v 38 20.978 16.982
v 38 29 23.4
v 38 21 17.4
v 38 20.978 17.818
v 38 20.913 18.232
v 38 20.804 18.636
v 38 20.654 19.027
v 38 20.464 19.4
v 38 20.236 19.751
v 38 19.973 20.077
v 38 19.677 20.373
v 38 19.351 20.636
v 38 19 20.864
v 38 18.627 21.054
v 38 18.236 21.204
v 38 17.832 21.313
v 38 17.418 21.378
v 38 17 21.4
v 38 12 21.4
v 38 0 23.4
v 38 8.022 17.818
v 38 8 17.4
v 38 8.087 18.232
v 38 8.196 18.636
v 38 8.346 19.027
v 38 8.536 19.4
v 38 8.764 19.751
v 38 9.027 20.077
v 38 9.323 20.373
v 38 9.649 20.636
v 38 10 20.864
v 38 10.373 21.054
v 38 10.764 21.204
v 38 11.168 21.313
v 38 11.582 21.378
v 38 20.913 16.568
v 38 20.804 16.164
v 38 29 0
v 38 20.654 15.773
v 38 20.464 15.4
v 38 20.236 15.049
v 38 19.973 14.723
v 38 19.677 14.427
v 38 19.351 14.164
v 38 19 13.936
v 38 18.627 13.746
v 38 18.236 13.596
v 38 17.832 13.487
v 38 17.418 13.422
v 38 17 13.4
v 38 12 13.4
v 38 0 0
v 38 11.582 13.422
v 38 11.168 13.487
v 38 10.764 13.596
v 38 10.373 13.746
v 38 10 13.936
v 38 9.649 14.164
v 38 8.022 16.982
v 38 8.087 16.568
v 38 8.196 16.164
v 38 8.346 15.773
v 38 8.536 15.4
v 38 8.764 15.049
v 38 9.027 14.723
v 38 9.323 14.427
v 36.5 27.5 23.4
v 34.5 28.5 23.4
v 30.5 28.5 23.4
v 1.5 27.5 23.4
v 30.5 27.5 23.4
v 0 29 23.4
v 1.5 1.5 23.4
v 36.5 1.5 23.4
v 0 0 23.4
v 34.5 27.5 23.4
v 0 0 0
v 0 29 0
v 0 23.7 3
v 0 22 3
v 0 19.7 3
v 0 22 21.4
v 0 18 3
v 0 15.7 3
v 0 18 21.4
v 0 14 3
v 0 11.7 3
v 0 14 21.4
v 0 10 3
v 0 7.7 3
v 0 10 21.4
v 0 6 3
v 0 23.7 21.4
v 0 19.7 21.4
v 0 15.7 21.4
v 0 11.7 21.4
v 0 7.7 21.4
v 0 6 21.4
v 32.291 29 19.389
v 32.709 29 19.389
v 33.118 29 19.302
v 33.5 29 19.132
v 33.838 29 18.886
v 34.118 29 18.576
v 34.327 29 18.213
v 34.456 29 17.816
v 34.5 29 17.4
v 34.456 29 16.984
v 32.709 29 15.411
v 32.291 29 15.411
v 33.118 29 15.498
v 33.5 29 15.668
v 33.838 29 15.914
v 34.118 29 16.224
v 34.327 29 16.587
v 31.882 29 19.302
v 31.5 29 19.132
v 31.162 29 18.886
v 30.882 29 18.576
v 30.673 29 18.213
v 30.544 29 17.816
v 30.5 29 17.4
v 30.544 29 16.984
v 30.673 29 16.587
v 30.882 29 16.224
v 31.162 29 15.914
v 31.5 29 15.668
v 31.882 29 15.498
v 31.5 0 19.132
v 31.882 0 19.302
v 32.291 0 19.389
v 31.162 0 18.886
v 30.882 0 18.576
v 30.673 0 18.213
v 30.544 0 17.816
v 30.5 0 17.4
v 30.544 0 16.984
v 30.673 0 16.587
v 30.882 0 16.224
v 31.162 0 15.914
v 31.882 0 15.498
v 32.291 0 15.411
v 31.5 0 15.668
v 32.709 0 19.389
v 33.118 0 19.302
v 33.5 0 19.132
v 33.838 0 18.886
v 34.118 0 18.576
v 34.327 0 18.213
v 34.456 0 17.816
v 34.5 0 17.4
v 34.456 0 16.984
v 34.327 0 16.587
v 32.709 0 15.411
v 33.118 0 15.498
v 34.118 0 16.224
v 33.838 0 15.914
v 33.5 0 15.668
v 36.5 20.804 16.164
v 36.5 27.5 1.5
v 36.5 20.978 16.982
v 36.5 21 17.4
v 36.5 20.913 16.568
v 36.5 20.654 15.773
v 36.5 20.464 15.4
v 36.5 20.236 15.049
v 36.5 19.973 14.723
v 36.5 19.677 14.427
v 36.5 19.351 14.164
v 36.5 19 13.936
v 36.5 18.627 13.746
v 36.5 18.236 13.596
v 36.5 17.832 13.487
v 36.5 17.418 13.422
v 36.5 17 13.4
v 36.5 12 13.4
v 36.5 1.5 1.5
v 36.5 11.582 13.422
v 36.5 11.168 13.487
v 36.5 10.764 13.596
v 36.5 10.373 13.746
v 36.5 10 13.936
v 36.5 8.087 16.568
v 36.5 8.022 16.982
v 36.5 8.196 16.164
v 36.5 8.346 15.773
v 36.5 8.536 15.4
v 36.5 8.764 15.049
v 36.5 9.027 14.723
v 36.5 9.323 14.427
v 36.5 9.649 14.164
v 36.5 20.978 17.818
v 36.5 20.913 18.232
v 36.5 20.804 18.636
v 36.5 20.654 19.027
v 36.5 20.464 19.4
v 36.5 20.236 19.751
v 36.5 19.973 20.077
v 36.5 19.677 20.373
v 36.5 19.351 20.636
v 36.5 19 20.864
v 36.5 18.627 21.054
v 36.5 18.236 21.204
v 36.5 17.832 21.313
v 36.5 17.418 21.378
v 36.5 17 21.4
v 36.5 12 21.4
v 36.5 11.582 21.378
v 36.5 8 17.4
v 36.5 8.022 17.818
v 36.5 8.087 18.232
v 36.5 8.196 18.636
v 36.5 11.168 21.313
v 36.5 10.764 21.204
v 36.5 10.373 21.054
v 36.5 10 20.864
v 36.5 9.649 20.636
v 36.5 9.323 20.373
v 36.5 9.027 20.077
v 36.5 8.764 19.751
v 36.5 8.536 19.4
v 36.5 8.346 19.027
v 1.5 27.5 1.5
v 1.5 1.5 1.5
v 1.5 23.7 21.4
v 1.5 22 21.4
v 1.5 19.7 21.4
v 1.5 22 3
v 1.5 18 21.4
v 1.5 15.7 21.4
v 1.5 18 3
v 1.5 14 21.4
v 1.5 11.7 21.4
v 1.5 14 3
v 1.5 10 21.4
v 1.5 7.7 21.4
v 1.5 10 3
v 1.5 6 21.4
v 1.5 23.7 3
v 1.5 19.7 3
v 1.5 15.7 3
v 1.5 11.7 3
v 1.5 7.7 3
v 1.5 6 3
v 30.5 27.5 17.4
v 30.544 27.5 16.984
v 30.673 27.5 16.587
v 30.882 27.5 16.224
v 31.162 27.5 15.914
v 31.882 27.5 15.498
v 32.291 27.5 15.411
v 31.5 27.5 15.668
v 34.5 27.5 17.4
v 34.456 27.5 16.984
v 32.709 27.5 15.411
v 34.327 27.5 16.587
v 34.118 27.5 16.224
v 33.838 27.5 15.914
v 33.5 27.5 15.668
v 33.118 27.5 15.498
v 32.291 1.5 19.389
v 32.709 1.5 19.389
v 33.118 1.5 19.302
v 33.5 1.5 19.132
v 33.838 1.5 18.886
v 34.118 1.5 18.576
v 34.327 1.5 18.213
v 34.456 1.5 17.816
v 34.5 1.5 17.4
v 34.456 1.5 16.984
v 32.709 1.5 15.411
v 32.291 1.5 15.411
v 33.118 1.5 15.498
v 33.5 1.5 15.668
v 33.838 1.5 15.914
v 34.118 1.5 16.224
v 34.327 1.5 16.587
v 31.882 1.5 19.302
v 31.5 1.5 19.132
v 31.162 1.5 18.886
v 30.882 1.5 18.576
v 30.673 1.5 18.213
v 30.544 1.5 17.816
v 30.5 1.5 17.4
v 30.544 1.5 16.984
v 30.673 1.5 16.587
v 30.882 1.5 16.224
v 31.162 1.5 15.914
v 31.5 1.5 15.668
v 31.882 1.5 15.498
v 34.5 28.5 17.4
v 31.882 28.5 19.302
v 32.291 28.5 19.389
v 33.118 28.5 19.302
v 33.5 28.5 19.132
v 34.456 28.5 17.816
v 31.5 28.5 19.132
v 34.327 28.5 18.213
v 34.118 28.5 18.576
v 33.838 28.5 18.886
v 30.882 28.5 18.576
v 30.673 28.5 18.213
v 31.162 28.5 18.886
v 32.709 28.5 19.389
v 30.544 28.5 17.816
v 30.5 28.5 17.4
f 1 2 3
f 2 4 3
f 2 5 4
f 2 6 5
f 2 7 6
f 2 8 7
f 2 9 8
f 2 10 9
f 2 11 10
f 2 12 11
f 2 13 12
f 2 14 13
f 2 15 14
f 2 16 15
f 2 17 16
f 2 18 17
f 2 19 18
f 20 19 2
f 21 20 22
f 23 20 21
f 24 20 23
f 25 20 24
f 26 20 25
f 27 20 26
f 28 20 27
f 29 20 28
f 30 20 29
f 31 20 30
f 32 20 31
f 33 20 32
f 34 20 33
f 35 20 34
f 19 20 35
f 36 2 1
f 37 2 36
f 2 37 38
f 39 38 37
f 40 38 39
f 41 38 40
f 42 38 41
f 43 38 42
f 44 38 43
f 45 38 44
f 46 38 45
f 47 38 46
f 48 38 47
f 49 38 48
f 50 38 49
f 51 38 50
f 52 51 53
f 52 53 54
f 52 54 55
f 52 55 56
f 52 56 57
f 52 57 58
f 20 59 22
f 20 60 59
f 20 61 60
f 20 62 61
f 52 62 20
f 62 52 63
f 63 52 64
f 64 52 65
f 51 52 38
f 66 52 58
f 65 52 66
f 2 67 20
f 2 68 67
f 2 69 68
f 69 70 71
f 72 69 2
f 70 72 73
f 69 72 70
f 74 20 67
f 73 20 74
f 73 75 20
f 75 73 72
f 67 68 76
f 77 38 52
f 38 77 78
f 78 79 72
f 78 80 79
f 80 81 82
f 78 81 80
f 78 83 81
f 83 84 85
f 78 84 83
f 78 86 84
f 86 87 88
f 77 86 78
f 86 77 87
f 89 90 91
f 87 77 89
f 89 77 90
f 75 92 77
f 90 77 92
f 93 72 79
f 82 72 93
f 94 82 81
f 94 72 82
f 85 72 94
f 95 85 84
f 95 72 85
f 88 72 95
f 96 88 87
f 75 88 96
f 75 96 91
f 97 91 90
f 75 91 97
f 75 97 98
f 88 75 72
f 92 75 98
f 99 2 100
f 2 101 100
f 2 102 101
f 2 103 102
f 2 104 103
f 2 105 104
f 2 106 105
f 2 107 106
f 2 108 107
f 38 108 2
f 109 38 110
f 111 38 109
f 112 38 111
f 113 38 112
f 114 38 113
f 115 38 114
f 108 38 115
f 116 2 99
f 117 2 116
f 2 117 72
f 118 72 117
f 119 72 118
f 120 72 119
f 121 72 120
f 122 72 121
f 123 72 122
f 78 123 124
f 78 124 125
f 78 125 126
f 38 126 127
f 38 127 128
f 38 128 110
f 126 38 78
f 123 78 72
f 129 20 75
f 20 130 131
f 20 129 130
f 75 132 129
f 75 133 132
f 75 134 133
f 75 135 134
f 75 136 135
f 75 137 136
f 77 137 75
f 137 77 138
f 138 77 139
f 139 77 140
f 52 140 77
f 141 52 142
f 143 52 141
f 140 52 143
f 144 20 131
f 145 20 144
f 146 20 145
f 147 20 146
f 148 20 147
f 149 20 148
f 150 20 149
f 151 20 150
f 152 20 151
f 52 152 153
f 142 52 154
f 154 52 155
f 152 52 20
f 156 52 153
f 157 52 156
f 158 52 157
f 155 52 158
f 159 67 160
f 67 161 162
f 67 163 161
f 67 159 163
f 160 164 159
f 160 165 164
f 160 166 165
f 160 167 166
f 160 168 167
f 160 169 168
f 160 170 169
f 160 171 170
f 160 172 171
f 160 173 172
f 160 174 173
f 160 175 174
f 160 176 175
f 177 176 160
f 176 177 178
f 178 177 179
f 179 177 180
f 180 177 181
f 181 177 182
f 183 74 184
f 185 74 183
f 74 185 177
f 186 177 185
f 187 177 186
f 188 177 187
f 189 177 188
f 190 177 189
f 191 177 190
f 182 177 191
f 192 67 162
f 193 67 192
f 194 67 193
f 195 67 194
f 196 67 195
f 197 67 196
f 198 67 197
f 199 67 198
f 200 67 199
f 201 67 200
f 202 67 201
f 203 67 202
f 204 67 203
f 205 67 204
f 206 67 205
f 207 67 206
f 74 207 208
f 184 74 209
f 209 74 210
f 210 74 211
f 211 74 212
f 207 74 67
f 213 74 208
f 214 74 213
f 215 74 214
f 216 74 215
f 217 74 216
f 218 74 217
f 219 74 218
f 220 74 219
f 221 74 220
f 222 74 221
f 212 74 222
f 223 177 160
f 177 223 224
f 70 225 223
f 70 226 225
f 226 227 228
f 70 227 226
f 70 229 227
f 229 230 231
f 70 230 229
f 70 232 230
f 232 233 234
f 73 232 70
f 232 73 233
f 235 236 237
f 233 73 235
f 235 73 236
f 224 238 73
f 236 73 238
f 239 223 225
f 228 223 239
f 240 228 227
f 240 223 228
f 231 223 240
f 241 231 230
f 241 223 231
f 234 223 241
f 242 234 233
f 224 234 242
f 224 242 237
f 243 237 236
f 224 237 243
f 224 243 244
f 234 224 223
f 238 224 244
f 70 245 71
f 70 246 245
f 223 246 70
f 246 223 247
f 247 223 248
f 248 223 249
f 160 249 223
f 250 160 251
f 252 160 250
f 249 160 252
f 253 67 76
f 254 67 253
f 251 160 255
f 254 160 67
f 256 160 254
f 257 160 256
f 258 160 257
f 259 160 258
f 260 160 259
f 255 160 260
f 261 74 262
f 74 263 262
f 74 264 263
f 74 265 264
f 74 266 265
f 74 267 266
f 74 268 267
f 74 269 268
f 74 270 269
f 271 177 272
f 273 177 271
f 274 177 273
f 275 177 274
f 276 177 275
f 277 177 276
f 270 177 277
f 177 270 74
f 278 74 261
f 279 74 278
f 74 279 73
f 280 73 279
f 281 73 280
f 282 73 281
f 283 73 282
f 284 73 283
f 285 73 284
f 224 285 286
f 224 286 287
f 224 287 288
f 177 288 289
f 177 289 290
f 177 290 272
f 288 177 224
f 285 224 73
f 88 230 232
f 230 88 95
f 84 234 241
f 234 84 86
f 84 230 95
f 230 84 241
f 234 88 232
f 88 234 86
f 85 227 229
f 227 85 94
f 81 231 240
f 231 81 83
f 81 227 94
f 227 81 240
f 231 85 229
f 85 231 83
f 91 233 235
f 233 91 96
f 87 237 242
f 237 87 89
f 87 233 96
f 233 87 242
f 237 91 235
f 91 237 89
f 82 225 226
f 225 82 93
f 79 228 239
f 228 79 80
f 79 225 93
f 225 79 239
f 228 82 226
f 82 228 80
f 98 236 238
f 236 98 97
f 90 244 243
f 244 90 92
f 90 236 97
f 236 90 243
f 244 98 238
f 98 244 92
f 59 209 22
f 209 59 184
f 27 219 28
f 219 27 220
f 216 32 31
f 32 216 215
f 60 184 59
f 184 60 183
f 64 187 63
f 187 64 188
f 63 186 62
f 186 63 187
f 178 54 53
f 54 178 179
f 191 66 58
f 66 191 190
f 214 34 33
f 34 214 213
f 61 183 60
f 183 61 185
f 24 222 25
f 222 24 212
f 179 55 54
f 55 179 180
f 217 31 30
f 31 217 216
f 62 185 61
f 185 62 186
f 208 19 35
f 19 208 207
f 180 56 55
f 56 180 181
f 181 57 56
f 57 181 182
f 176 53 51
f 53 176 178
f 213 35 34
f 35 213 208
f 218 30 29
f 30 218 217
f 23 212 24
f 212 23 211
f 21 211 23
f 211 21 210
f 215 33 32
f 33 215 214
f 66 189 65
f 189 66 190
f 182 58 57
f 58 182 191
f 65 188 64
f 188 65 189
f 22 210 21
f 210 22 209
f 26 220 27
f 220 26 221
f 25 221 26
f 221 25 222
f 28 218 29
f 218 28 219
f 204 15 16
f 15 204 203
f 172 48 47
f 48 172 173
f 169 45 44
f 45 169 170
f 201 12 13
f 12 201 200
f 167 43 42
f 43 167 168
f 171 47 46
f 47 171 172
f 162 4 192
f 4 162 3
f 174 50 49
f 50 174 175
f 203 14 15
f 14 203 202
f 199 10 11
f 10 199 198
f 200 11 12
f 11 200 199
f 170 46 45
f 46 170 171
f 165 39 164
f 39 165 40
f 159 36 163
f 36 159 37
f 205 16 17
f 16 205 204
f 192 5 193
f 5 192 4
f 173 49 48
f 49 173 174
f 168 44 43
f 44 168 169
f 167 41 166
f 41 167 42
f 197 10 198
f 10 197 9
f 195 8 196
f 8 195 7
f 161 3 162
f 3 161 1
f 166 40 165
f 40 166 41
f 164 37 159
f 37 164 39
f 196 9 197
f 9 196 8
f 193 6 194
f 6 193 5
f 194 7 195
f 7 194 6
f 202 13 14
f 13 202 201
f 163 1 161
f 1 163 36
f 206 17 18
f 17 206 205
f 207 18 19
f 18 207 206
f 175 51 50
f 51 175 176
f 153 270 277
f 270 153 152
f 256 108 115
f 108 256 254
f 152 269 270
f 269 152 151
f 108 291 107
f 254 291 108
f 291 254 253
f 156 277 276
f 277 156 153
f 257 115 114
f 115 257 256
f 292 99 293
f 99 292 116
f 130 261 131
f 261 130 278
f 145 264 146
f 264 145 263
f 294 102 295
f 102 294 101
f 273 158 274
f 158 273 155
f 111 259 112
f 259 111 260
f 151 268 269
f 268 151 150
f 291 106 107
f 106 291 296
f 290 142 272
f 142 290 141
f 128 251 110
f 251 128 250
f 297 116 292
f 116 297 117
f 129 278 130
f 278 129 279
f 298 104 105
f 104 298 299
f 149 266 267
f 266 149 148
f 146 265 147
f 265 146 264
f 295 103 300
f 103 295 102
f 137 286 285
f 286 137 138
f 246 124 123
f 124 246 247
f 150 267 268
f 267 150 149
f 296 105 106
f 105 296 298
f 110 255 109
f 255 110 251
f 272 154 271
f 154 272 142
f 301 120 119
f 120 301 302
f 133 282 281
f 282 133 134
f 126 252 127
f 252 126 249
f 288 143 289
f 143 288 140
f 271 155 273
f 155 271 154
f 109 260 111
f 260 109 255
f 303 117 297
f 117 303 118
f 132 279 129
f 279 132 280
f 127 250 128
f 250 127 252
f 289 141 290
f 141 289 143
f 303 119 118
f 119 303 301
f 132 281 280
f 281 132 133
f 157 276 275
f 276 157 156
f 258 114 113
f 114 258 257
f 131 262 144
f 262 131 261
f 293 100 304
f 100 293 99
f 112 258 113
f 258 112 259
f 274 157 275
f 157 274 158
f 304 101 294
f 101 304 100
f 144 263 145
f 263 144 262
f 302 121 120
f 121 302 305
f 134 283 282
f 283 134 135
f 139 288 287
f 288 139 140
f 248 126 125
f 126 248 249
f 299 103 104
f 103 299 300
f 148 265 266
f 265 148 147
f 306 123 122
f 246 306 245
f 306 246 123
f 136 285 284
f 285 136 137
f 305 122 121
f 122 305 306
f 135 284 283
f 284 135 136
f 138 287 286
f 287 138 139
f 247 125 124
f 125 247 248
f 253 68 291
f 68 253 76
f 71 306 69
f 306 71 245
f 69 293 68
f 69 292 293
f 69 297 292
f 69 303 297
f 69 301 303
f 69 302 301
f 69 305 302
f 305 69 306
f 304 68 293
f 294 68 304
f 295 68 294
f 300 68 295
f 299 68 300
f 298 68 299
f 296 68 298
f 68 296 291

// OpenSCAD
/*
modular enclosure for ESP32-S2 style of wemos D1 Mini 
MIT Licence
Copyright 2023 James Dodgen
*/

// make_one();
//make_relay_lid(letter="U");


module make_one(letter="X")
{
    translate([2,0,0]) make_s2_base();
    make_relay_lid(letter=letter);
}

//make_lids("HHHXXZZTT", chars_per_row=5);
module make_lids(letters, chars_per_row=5)
{
   x_spacing = 40;
   y_spacing = 30;
   char_list = [ for (i = [0 : len(letters) - 1]) letters[i] ];
   
   for (x = [0: floor(len(letters)/chars_per_row)])
   {      
       base = x*chars_per_row;
       echo(">>>> base =",base) 
       
       for (y =  [1:chars_per_row])
       {
           chr_ndx = base+y-1;
           echo("y=",y, " x=",x, "chr_ndx=", chr_ndx)
           if (chr_ndx < len(char_list))
           {
               echo("print this:", char_list[chr_ndx], chr_ndx);
               translate([x*x_spacing, y*y_spacing, 0])
                    make_relay_lid(letter=char_list[chr_ndx]);
           }
       } 
   }
   
    
}

make_somthing = 1;    // 1 base, 2=lid, 3 buttons
if (make_somthing == 1) {
    make_s2_base();
} else if (make_somthing == 2) {
    make_relay_lid();
} else if (make_somthing == 3) {
    make_button();
    translate([6,0,0]) 
        make_button(long=true); // two needed, short for the "O" long for the "RST"
}

Mx_fn = 12; // self tapping 
M3_screw_hole = 2.8; 
M3_clearence_hole = 3.6; 
M3_head_clearence_hole = 6.3;

M2_5_screw_hole = 2.7; 
M2_5_clearence_hole = 3.1; 
M2_5_head_clearence_hole = 6.2;

M2_screw_hole = 2.16; 
M2_clearence_hole = 2.6; 

drill_length = 20;
s2_y=26;
s2_x=35;
s2_thickness=4;
shell_wall_thickness = 1.5;
shell_post_d = 7;

usb_c_hole_width = 13;
usb_c_hole_height = 8;

short_base = false;
double_cutout_y = 11;
double_cutout_x = 13.5;
double_cutout_z = shell_wall_thickness;
double_cutout_y_offset = 10;
double_cut_out = false;

8x8_cutout_x = 21;
8x8_cutout_y = 21;
8x8_loc = [0,0,0];  
8x8_cutout = true;

offset_z = (short_base == true) ? 0:12.4;  // 13

shell_x = s2_x + (shell_wall_thickness*2);   // adjustments off of S2 D1 Mini
shell_y = s2_y + (shell_wall_thickness*2);

shell_z = offset_z+usb_c_hole_height+shell_wall_thickness*2;


posts_total_height = (shell_z/2)-2.5; //usb_c_hole_height/2+shell_wall_thickness-2.5;



module make_s2_base() {
    difference()
    {
        union()
        {
            if (short_base == true) 
                make_s2_mini_mount(front_stops=false);
            //translate([-(shell_x-s2_x)+shell_wall_thickness,(-(shell_y-s2_y)/2),0])
            {
                shell();
            }
        }
        z = (short_base == true) ? 
                    shell_z/2-usb_c_hole_height/2 
                    : 
                    shell_z -usb_c_hole_height-2;
        translate([s2_x+0.5, (shell_y-usb_c_hole_width)/2, z])
            usb_c_hole();
        hole_d = 4;
        
        hz = (short_base == true) ? shell_z/2-0.4 : shell_z-usb_c_hole_height+2.0;
        translate([shell_x-shell_wall_thickness-(hole_d/2)-2,0, hz]){
            rotate([-90,0,0])cylinder(h=shell_y, d=hole_d, $fn=30);
        }
        translate([shell_x-shell_wall_thickness-(hole_d/2)-4, (shell_y-hole_d/2)-2.5, hz]) {
            cube([hole_d,hole_d,10]);
        }
        
        if (double_cut_out == true)
            translate([shell_x-double_cutout_x, shell_y-double_cutout_y-double_cutout_y_offset, 0])
                cube([double_cutout_x, double_cutout_y, double_cutout_z]);
   
    }
    
    
}

lid_mount_Loc_1 = [shell_x/2,shell_wall_thickness,shell_z-2];
lid_mount_Loc_2 = [shell_x/2,shell_y-shell_wall_thickness,shell_z-2];

//shell();
module shell()
{
    difference()
    {
        cube([shell_x, shell_y, shell_z]) ;
        translate([shell_wall_thickness, shell_wall_thickness ,shell_wall_thickness])
        {
            cube([shell_x - (shell_wall_thickness*2), shell_y-shell_wall_thickness*2, shell_z]);
        }
        mid_y = shell_y/2-0.5;
       
        make_slot([0,mid_y,   3],height=shell_z-5);
        make_slot([0,mid_y+4, 3],height=shell_z-5);
        make_slot([0,mid_y-4, 3],height=shell_z-5);
        make_slot([0,mid_y+8, 3],height=shell_z-5);
        make_slot([0,mid_y-8, 3],height=shell_z-5);
        //make_slot([0,mid_y-12,3],height=shell_z-5);
        //make_slot([0,mid_y+12,3],height=shell_z-5);
        //make_slot([0,mid_y-16,3],height=shell_z-5);
        //make_slot([0,mid_y+16,3],height=shell_z-5);
        *translate([33,0.5,9])
            rotate([90,0,0])
                center_text("R", size=5, extrude=1.2);
        *translate([33,shell_y+0.7,9])
            rotate([90,0,0])
                center_text("O", size=5, extrude=1.2);       
        
    }
    //lid_mount(lid_mount_Loc_1, rot=0);
    //lid_mount(lid_mount_Loc_2, rot=180); 
}

//make_relay_lid();
module make_relay_lid(letter="W")
{
    hat_x = 32;
    hat_y = 26.5;
    lip_depth = 2.5;
    shrinkage = 0.25;
    lip_width = 4.7;

    rotate([0,180.0])  // print upside down
    difference()
    {
        union()
        {
            tab_height= 3.5;
            led_view_hole = 4;
            slop = (shrinkage+shell_wall_thickness);
            lip_x = shell_x-slop*2;
            lip_y = shell_y-slop*2;
            difference()
            {
                union()
                {
                    color("orange") cube([shell_x, shell_y, shell_wall_thickness]);
                    
                    hold_down_width=6;
                    translate([3,(shell_y-hold_down_width)/2, -tab_height]) 
                        cube([3,hold_down_width,tab_height]);
                
                    difference()
                    {
                        //translate([shrinkage+shell_wall_thickness, 
                             //shrinkage+shell_wall_thickness,-lip_depth])
                        translate([(shell_x-lip_x)/2, (shell_y-lip_y)/2, -lip_depth])
                        {
                            color("green") cube([lip_x, lip_y, lip_depth]);
                        }
                        cut_out_x = lip_x-lip_width*2+10;
                        cut_out_y = lip_y-lip_width*2+3;
                        //translate([shrinkage+shell_wall_thickness/2, 
                        //shrinkage+shell_wall_thickness/2,   0])
                        translate([(shell_x-cut_out_x)/2-shrinkage, (shell_y-cut_out_y)/2,  -lip_depth])
                                cube([cut_out_x, cut_out_y, lip_depth]);
                    }
                    hold_down_h = 6.7;
                    hold_down_d = 3;
                    translate([(lip_x+hold_down_d/2+shrinkage)-hold_down_d/2, 
                              (hold_down_d/2+shrinkage)+hold_down_d/2,   -hold_down_h])
                        cylinder(d=3, h=hold_down_h, $fn=40);
                    translate([(lip_x+hold_down_d/2+shrinkage)-hold_down_d/2,
                        lip_y-(hold_down_d/2-shrinkage)+hold_down_d/2,-hold_down_h])
                        cylinder(d=3, h=hold_down_h, $fn=40);
                }
                
                view_hole_h = shell_wall_thickness+lip_depth;
                translate([slop, (-led_view_hole/2)+shell_y/4.16, 
                        -view_hole_h+shell_wall_thickness])
                    cube([led_view_hole,led_view_hole, view_hole_h]); 
                
                translate([shell_x*0.6, shell_y*.47, 0])
                    rotate([0,0,90])
                        center_text(letter, size=8, extrude=shell_wall_thickness*2);                
            }
            
            
        }
    }
}

/* 
START Wemos S2 Mini mount code
*/



post_d = M2_screw_hole+1.5;
hole_offset_x = shell_wall_thickness+post_d/2; 
hole1_offset_y = shell_wall_thickness+(post_d/2)+1;
hole2_offset_y= hole1_offset_y+20.4;  

hole1_loc = [hole_offset_x, hole1_offset_y,0];
hole2_loc = [hole_offset_x, hole2_offset_y,0];
button_hole_d = 4;
module make_s2_mini_mount(button_guides=true, front_stops=true)
{
    
    suport_x = s2_x - post_d/2;
    suport_post1_loc = [suport_x, hole1_offset_y, 0];
    suport_post2_loc = [suport_x, hole2_offset_y, 0];
    
    //translate([-1,-1,0]) cube([s2_x+2,s2_y+2,s2_thickness]);
    *if (button_guides == true) {
        translate([s2_x-8,-3.5,0]) 
            cube([8, 2, 13]);
        translate([s2_x-8,s2_y+3,0]) 
            cube([8, 2, 13]);
    }
    post(hole1_loc, posts_total_height, post_d);
    post(hole2_loc, posts_total_height, post_d);
    post(suport_post1_loc, posts_total_height, post_d);
    post(suport_post2_loc, posts_total_height, post_d);

    // side supports
    //translate([-2.4,-2.3,0]) cube([28,2,10]);
    //translate([-2.4,s2_y+0.3,0]) cube([29,2,10]);

    // end sppports
    //translate([-2.4, -0.5, 0]) cube([2,5,10]);
    //translate([-2.4, s2_y-5+0.5, 0]) cube([2,5,10]);
    
    if (front_stops == true) {  // where usb-c is
        translate([s2_x+0.5, -0.2, 0]) cube([2,5,10]);
        translate([s2_x+0.5, s2_y-5+0.2, 0]) cube([2,5,10]);
    }
}

//make_button();
module make_button(long=false) 
{
  lth=long?11:9;
  cylinder(h = lth , d = button_hole_d*0.8, $fn = 40); 
  cylinder(h = 1 , d = 4.5, $fn = 40); 
}

module make_s2_mini_mount_cutout()
{
    {
        //screw_hole(hole1_loc, posts_total_height, M2_screw_hole);
        //screw_hole(hole2_loc, posts_total_height, M2_screw_hole);
        //antenna_cutout();
        color("purple")
        {
        //base_x = s2_x; // + 10;
        //base_y = s2_y; // + 17;
        //base_z = 20;
        //base_wall_thickness = 1.5;
            
        translate([s2_x+0.5, (s2_y-usb_c_hole_width)/2, s2_thickness+1])
            usb_c_hole();
        
       translate([s2_x-3.9, 0.5, s2_thickness+5]) 
            rotate([90,0.0])
                cylinder(h = 20 , d = button_hole_d, $fn = 40, center=false);
        
       translate([s2_x-3.9, s2_y, s2_thickness+5.2]) 
            rotate([270,0.0])
                cylinder(h = 20, d = button_hole_d, $fn = 40, center=false);
        }
    }
}

module post(loc,height, diameter) {
    translate(loc)
        cylinder(h=height, d=diameter, $fn=30);
}

module screw_hole(loc,height, screw_hole)
{
    translate(loc)
        cylinder(h=height, d=screw_hole, $fn=Mx_fn); 
        // fn=Mx_fn makes it self threading
}
module antenna_cutout()
{
    translate([-1,hole1_offset_y+(post_d/2)+0.7,0])
        cube([7, s2_y-hole1_offset_y-(post_d*2), s2_thickness]);
}

//usb_c_hole();
module usb_c_hole()
{
    cut_out_height = 20; //base_wall_thickness+4;
    translate([-2, usb_c_hole_height/2, usb_c_hole_height/2])
    {
        color("green") 
        rotate([0,90,0])
            cylinder(h = cut_out_height, d = usb_c_hole_height, center=false, $fn = 60);
    }
    translate([-2, usb_c_hole_width-(usb_c_hole_height/2), usb_c_hole_height/2])
    {
        color("orange") 
        rotate([0,90,0])
            cylinder(h = cut_out_height, d = usb_c_hole_height, center=false, $fn = 60);
    }
    filler_block_y = usb_c_hole_width - usb_c_hole_height;
    translate([-2,usb_c_hole_height/2,0])
        cube ([cut_out_height, filler_block_y, usb_c_hole_height]);
    
    *translate([0.1,0,0])
        cube ([shell_wall_thickness, usb_c_hole_width, usb_c_hole_height]);
}
/*
END  wemos s2 mini mount */

// service routines

module fillet(rot, r, h) {
    translate([r / 2, r / 2, h/2])
    rotate([0,0,rot]) difference() {
        cube([r + 0.01, r + 0.01, h], center = true);
        translate([r/2, r/2, 0])
            cylinder(r = r, h = h + 1, center = true);
    }
}

//make_slot([0,0,0,]);
//make_slot([0,0,0,], rotate=1);
module make_slot(s, rotate=0, width=1.7, height=10) {
	thickness = 5;

    if (rotate == 1)	
    {
        translate([s.x-width/2, s.y-thickness/2, s.z])
        cube([width, thickness, height]);		
    }
    else
    {
        translate([s.x-thickness/2, s.y, s.z])
        cube([thickness, width, height]);
    }

}

//linear_extrude(height = 5) import(file="stencil_TNH.dxf", layer="A", scale=1);
//center_text("B", size=7, extrude=shell_wall_thickness); 
module center_text(text, size, font="Liberation Mono:style=Regular", width=0, length=0, extrude=0.6) {
    $fn = 30;
    translate([-5.5, -4, -extrude/2]) 
      scale([1.3,1,1])
        linear_extrude(extrude) 
            import(file="stencil_TNH.dxf", layer=text, scale=1);
            //text(text, size=size, font=font, halign="center", valign="center");
}
